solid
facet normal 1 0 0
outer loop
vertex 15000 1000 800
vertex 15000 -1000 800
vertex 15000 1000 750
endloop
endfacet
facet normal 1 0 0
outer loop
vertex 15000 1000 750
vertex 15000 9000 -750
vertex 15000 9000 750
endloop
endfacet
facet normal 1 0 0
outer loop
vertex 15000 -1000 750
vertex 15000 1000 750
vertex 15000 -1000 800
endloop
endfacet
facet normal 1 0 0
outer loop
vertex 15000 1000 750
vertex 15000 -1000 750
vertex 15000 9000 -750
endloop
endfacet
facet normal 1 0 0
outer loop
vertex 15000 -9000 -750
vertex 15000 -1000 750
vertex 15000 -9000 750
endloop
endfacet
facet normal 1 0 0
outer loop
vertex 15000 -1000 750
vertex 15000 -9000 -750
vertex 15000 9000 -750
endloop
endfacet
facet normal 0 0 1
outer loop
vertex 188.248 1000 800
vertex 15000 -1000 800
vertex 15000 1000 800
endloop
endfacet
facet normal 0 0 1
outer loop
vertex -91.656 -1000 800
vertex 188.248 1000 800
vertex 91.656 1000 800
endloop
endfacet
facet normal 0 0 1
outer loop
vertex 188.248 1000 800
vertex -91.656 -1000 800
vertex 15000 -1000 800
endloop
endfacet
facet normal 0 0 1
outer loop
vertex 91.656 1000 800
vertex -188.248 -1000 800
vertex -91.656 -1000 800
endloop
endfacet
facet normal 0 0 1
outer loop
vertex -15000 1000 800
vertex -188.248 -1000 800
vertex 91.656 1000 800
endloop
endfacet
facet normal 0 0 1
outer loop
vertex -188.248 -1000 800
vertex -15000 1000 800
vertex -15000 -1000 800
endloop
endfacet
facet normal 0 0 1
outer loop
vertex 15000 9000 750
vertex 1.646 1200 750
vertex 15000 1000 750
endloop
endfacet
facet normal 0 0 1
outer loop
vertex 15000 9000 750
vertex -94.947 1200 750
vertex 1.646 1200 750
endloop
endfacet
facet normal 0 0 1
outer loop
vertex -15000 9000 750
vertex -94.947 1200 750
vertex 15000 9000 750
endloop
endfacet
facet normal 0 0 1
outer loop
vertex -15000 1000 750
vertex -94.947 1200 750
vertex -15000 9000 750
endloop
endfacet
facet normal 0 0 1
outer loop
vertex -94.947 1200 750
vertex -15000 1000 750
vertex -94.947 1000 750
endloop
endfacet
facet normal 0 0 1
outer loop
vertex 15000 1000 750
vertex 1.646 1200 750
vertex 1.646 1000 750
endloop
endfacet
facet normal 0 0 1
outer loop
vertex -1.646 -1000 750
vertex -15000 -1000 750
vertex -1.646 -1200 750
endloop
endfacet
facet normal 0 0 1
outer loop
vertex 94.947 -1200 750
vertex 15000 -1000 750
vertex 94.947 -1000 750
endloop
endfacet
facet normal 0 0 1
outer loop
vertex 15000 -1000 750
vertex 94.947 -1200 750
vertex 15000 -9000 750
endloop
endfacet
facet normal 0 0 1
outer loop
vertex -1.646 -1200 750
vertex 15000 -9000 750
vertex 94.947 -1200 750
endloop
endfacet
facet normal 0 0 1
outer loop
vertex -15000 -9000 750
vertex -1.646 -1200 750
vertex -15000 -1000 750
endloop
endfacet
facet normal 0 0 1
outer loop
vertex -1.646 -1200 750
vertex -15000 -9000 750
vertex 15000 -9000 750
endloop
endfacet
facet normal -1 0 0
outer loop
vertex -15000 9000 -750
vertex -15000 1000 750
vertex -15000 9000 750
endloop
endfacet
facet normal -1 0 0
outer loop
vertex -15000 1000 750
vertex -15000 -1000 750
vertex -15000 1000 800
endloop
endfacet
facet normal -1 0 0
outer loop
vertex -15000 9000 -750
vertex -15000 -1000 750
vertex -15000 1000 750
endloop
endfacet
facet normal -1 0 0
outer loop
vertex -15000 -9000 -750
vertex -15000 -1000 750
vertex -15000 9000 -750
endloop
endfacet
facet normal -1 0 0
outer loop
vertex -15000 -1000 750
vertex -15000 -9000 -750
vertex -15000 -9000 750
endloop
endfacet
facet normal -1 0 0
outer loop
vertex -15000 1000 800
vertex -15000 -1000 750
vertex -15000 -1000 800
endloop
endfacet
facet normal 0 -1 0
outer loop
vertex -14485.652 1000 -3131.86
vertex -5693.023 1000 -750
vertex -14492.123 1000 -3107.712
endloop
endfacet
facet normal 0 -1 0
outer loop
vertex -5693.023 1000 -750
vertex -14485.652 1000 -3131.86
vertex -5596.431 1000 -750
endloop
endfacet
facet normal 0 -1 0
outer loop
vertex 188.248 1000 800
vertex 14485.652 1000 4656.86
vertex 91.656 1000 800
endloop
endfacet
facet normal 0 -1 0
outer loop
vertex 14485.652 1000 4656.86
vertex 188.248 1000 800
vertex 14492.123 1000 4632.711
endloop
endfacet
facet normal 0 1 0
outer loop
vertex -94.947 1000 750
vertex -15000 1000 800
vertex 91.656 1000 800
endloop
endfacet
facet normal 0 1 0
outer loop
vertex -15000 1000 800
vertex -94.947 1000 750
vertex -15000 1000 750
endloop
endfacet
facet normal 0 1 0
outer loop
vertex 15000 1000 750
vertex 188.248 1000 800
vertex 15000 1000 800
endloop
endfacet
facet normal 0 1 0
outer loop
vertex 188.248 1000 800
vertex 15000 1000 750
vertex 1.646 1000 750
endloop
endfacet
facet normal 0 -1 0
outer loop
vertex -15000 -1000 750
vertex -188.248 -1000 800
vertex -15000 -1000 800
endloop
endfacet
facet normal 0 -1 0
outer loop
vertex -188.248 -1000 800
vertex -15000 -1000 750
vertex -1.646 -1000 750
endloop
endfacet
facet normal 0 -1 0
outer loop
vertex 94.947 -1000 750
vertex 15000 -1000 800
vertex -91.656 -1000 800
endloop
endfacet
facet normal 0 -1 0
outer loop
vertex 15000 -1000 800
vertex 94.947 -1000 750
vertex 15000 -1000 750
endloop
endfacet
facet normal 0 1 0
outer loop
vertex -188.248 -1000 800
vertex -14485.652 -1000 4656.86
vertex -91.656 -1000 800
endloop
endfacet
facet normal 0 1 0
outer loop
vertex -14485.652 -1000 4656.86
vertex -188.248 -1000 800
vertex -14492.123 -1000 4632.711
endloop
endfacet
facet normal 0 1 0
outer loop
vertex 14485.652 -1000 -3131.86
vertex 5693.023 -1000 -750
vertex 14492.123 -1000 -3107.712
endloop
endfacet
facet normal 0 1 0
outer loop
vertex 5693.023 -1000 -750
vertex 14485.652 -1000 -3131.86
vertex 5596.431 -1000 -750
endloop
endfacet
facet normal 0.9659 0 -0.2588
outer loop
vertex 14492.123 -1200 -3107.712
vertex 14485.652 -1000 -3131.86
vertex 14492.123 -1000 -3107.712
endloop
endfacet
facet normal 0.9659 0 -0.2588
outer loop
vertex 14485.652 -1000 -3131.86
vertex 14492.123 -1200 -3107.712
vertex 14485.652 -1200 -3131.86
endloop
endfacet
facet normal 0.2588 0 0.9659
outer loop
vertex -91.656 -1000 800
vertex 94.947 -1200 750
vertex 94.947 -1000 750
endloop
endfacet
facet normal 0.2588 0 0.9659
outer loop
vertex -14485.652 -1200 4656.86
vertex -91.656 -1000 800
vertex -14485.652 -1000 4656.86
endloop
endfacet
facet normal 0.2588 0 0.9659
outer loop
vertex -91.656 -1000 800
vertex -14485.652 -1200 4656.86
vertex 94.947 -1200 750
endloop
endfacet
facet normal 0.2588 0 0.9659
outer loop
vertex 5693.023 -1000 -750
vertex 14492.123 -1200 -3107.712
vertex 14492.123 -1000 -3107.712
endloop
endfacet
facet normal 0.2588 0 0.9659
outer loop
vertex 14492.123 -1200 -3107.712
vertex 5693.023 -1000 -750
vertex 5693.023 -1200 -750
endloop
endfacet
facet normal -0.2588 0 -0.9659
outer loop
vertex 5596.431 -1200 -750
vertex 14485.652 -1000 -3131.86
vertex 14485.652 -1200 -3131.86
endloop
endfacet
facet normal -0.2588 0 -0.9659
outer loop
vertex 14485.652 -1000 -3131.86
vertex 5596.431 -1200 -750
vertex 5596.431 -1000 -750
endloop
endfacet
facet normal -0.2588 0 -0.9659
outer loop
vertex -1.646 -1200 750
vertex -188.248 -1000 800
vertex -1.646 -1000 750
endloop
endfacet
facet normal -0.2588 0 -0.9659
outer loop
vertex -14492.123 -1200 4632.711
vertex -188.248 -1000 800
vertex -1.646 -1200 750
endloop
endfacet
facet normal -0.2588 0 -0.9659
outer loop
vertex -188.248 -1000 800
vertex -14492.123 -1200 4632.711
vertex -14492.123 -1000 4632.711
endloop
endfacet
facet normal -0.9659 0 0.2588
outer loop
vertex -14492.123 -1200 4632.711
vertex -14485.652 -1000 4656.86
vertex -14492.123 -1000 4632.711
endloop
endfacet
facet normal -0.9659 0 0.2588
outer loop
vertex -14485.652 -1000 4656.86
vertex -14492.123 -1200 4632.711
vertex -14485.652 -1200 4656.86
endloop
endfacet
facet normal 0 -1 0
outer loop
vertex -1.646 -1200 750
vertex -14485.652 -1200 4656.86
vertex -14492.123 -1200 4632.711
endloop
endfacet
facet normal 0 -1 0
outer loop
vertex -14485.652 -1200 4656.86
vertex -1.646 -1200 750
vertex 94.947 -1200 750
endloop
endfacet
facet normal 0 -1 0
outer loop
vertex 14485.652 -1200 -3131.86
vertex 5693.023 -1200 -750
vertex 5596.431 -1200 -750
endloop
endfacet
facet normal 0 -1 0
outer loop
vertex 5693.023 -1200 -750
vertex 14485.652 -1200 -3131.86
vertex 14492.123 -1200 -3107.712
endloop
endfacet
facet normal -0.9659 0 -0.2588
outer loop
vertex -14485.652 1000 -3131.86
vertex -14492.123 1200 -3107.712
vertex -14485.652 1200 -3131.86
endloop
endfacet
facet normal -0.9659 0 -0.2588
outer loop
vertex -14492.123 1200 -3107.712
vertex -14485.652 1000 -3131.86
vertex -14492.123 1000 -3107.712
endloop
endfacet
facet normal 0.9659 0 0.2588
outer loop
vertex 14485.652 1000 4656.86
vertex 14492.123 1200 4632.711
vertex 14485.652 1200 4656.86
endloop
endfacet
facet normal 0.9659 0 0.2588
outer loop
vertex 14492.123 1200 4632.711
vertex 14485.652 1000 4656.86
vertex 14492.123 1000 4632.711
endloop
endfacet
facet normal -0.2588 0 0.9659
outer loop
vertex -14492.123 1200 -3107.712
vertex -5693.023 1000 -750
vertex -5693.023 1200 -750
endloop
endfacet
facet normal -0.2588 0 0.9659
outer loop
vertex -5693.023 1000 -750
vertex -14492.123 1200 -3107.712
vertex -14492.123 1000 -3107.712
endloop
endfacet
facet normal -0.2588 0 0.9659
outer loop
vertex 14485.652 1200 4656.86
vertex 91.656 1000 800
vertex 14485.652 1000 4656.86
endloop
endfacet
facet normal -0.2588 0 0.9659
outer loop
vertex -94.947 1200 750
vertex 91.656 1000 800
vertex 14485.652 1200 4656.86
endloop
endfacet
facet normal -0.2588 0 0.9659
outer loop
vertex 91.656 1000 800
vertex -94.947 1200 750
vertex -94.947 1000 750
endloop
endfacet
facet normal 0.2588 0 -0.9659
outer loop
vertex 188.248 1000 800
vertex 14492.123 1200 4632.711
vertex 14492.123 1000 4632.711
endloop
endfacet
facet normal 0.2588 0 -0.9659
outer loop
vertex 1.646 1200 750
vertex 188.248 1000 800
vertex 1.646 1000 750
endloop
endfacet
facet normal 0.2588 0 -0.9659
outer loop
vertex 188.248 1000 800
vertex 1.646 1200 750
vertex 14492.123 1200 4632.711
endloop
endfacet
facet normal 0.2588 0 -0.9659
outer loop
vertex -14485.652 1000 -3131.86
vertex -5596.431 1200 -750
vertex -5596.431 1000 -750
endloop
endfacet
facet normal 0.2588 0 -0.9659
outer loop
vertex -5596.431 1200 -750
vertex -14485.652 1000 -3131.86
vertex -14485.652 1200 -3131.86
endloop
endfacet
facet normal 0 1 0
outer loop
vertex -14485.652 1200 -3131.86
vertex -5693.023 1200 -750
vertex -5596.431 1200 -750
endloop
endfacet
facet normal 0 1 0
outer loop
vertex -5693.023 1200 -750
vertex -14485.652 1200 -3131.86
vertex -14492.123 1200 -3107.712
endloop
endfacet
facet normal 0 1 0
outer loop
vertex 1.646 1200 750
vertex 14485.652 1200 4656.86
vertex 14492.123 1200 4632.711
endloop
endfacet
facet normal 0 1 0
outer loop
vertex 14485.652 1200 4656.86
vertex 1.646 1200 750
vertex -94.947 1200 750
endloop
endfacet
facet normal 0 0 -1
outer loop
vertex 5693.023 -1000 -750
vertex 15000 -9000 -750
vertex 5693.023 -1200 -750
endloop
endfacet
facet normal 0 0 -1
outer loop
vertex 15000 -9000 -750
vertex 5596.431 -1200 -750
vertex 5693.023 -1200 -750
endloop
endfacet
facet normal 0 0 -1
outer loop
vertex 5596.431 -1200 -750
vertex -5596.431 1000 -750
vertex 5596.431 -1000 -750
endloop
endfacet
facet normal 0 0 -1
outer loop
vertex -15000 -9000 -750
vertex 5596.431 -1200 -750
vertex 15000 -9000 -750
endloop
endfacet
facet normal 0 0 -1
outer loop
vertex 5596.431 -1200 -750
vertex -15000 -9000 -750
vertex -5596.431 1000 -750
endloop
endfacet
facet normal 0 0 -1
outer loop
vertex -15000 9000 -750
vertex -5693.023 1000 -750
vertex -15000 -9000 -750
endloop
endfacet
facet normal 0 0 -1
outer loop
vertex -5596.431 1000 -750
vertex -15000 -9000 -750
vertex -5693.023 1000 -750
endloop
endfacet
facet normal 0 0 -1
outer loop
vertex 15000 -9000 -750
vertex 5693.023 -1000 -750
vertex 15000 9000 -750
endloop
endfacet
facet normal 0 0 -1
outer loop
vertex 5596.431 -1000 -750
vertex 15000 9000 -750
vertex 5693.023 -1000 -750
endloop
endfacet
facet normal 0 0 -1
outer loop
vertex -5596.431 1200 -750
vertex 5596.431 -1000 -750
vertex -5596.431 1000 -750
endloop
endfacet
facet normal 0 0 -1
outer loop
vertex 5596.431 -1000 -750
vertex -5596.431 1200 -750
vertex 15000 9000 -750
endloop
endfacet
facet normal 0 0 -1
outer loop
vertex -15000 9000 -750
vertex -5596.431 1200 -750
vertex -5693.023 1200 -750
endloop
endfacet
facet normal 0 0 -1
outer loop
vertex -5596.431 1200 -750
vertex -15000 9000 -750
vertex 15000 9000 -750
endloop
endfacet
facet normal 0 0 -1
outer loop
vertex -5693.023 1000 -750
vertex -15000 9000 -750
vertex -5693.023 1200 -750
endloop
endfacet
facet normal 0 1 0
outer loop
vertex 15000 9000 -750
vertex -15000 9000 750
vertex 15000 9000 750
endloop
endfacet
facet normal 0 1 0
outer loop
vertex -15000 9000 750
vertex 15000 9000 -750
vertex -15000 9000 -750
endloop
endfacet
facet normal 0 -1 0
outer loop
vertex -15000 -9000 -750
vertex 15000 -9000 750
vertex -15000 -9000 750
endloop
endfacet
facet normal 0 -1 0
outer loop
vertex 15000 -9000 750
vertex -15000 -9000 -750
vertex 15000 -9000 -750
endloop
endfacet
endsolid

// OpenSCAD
// =========================================================================
// GRUMMAN-STYLED INFLATABLE CARRIER - SURFACE-MOUNT EDDY-TAPE PROFILE
// MANUFACTURER: HUNTINGTON INGALLS / NEWPORT NEWS SHIPBUILDING
// MATERIAL PROFILE: GRADE 5 TITANIUM SHIELDED SURFACE ARRANGEMENT
// =========================================================================

module surface_mount_eddy_tape(strip_length=30000, tape_width=2000, total_thickness=50) {
    // Applied directly on horizontal surfaces without cutting a recess channel
    union() {
        // Core Induction Layer (The active Eddy-Tape core)
        translate([0, 0, total_thickness/2])
            cube([strip_length, tape_width, total_thickness], center=true);
            
        // Left Tapered Transition Safety Ramp (15-degree tire clearance slope)
        translate([0, -tape_width/2 - 100, total_thickness/4])
            rotate([0, 15, 0])
                cube([strip_length, 200, total_thickness/2], center=true);
                
        // Right Tapered Transition Safety Ramp (15-degree tire clearance slope)
        translate([0, tape_width/2 + 100, total_thickness/4])
            rotate([0, -15, 0])
                cube([strip_length, 200, total_thickness/2], center=true);
    }
}

module non_recessed_flight_deck() {
    // Solid flatbed deck panel with NO subtractive recess channels
    cube([30000, 18000, 1500], center=true);
    
    // Apply the surface-mount modular induction tape straight onto the horizontal surface
    translate([0, 0, 1500/2])
        surface_mount_eddy_tape();
}

// Render complete un-recessed surface applied arrangement
non_recessed_flight_deck();
